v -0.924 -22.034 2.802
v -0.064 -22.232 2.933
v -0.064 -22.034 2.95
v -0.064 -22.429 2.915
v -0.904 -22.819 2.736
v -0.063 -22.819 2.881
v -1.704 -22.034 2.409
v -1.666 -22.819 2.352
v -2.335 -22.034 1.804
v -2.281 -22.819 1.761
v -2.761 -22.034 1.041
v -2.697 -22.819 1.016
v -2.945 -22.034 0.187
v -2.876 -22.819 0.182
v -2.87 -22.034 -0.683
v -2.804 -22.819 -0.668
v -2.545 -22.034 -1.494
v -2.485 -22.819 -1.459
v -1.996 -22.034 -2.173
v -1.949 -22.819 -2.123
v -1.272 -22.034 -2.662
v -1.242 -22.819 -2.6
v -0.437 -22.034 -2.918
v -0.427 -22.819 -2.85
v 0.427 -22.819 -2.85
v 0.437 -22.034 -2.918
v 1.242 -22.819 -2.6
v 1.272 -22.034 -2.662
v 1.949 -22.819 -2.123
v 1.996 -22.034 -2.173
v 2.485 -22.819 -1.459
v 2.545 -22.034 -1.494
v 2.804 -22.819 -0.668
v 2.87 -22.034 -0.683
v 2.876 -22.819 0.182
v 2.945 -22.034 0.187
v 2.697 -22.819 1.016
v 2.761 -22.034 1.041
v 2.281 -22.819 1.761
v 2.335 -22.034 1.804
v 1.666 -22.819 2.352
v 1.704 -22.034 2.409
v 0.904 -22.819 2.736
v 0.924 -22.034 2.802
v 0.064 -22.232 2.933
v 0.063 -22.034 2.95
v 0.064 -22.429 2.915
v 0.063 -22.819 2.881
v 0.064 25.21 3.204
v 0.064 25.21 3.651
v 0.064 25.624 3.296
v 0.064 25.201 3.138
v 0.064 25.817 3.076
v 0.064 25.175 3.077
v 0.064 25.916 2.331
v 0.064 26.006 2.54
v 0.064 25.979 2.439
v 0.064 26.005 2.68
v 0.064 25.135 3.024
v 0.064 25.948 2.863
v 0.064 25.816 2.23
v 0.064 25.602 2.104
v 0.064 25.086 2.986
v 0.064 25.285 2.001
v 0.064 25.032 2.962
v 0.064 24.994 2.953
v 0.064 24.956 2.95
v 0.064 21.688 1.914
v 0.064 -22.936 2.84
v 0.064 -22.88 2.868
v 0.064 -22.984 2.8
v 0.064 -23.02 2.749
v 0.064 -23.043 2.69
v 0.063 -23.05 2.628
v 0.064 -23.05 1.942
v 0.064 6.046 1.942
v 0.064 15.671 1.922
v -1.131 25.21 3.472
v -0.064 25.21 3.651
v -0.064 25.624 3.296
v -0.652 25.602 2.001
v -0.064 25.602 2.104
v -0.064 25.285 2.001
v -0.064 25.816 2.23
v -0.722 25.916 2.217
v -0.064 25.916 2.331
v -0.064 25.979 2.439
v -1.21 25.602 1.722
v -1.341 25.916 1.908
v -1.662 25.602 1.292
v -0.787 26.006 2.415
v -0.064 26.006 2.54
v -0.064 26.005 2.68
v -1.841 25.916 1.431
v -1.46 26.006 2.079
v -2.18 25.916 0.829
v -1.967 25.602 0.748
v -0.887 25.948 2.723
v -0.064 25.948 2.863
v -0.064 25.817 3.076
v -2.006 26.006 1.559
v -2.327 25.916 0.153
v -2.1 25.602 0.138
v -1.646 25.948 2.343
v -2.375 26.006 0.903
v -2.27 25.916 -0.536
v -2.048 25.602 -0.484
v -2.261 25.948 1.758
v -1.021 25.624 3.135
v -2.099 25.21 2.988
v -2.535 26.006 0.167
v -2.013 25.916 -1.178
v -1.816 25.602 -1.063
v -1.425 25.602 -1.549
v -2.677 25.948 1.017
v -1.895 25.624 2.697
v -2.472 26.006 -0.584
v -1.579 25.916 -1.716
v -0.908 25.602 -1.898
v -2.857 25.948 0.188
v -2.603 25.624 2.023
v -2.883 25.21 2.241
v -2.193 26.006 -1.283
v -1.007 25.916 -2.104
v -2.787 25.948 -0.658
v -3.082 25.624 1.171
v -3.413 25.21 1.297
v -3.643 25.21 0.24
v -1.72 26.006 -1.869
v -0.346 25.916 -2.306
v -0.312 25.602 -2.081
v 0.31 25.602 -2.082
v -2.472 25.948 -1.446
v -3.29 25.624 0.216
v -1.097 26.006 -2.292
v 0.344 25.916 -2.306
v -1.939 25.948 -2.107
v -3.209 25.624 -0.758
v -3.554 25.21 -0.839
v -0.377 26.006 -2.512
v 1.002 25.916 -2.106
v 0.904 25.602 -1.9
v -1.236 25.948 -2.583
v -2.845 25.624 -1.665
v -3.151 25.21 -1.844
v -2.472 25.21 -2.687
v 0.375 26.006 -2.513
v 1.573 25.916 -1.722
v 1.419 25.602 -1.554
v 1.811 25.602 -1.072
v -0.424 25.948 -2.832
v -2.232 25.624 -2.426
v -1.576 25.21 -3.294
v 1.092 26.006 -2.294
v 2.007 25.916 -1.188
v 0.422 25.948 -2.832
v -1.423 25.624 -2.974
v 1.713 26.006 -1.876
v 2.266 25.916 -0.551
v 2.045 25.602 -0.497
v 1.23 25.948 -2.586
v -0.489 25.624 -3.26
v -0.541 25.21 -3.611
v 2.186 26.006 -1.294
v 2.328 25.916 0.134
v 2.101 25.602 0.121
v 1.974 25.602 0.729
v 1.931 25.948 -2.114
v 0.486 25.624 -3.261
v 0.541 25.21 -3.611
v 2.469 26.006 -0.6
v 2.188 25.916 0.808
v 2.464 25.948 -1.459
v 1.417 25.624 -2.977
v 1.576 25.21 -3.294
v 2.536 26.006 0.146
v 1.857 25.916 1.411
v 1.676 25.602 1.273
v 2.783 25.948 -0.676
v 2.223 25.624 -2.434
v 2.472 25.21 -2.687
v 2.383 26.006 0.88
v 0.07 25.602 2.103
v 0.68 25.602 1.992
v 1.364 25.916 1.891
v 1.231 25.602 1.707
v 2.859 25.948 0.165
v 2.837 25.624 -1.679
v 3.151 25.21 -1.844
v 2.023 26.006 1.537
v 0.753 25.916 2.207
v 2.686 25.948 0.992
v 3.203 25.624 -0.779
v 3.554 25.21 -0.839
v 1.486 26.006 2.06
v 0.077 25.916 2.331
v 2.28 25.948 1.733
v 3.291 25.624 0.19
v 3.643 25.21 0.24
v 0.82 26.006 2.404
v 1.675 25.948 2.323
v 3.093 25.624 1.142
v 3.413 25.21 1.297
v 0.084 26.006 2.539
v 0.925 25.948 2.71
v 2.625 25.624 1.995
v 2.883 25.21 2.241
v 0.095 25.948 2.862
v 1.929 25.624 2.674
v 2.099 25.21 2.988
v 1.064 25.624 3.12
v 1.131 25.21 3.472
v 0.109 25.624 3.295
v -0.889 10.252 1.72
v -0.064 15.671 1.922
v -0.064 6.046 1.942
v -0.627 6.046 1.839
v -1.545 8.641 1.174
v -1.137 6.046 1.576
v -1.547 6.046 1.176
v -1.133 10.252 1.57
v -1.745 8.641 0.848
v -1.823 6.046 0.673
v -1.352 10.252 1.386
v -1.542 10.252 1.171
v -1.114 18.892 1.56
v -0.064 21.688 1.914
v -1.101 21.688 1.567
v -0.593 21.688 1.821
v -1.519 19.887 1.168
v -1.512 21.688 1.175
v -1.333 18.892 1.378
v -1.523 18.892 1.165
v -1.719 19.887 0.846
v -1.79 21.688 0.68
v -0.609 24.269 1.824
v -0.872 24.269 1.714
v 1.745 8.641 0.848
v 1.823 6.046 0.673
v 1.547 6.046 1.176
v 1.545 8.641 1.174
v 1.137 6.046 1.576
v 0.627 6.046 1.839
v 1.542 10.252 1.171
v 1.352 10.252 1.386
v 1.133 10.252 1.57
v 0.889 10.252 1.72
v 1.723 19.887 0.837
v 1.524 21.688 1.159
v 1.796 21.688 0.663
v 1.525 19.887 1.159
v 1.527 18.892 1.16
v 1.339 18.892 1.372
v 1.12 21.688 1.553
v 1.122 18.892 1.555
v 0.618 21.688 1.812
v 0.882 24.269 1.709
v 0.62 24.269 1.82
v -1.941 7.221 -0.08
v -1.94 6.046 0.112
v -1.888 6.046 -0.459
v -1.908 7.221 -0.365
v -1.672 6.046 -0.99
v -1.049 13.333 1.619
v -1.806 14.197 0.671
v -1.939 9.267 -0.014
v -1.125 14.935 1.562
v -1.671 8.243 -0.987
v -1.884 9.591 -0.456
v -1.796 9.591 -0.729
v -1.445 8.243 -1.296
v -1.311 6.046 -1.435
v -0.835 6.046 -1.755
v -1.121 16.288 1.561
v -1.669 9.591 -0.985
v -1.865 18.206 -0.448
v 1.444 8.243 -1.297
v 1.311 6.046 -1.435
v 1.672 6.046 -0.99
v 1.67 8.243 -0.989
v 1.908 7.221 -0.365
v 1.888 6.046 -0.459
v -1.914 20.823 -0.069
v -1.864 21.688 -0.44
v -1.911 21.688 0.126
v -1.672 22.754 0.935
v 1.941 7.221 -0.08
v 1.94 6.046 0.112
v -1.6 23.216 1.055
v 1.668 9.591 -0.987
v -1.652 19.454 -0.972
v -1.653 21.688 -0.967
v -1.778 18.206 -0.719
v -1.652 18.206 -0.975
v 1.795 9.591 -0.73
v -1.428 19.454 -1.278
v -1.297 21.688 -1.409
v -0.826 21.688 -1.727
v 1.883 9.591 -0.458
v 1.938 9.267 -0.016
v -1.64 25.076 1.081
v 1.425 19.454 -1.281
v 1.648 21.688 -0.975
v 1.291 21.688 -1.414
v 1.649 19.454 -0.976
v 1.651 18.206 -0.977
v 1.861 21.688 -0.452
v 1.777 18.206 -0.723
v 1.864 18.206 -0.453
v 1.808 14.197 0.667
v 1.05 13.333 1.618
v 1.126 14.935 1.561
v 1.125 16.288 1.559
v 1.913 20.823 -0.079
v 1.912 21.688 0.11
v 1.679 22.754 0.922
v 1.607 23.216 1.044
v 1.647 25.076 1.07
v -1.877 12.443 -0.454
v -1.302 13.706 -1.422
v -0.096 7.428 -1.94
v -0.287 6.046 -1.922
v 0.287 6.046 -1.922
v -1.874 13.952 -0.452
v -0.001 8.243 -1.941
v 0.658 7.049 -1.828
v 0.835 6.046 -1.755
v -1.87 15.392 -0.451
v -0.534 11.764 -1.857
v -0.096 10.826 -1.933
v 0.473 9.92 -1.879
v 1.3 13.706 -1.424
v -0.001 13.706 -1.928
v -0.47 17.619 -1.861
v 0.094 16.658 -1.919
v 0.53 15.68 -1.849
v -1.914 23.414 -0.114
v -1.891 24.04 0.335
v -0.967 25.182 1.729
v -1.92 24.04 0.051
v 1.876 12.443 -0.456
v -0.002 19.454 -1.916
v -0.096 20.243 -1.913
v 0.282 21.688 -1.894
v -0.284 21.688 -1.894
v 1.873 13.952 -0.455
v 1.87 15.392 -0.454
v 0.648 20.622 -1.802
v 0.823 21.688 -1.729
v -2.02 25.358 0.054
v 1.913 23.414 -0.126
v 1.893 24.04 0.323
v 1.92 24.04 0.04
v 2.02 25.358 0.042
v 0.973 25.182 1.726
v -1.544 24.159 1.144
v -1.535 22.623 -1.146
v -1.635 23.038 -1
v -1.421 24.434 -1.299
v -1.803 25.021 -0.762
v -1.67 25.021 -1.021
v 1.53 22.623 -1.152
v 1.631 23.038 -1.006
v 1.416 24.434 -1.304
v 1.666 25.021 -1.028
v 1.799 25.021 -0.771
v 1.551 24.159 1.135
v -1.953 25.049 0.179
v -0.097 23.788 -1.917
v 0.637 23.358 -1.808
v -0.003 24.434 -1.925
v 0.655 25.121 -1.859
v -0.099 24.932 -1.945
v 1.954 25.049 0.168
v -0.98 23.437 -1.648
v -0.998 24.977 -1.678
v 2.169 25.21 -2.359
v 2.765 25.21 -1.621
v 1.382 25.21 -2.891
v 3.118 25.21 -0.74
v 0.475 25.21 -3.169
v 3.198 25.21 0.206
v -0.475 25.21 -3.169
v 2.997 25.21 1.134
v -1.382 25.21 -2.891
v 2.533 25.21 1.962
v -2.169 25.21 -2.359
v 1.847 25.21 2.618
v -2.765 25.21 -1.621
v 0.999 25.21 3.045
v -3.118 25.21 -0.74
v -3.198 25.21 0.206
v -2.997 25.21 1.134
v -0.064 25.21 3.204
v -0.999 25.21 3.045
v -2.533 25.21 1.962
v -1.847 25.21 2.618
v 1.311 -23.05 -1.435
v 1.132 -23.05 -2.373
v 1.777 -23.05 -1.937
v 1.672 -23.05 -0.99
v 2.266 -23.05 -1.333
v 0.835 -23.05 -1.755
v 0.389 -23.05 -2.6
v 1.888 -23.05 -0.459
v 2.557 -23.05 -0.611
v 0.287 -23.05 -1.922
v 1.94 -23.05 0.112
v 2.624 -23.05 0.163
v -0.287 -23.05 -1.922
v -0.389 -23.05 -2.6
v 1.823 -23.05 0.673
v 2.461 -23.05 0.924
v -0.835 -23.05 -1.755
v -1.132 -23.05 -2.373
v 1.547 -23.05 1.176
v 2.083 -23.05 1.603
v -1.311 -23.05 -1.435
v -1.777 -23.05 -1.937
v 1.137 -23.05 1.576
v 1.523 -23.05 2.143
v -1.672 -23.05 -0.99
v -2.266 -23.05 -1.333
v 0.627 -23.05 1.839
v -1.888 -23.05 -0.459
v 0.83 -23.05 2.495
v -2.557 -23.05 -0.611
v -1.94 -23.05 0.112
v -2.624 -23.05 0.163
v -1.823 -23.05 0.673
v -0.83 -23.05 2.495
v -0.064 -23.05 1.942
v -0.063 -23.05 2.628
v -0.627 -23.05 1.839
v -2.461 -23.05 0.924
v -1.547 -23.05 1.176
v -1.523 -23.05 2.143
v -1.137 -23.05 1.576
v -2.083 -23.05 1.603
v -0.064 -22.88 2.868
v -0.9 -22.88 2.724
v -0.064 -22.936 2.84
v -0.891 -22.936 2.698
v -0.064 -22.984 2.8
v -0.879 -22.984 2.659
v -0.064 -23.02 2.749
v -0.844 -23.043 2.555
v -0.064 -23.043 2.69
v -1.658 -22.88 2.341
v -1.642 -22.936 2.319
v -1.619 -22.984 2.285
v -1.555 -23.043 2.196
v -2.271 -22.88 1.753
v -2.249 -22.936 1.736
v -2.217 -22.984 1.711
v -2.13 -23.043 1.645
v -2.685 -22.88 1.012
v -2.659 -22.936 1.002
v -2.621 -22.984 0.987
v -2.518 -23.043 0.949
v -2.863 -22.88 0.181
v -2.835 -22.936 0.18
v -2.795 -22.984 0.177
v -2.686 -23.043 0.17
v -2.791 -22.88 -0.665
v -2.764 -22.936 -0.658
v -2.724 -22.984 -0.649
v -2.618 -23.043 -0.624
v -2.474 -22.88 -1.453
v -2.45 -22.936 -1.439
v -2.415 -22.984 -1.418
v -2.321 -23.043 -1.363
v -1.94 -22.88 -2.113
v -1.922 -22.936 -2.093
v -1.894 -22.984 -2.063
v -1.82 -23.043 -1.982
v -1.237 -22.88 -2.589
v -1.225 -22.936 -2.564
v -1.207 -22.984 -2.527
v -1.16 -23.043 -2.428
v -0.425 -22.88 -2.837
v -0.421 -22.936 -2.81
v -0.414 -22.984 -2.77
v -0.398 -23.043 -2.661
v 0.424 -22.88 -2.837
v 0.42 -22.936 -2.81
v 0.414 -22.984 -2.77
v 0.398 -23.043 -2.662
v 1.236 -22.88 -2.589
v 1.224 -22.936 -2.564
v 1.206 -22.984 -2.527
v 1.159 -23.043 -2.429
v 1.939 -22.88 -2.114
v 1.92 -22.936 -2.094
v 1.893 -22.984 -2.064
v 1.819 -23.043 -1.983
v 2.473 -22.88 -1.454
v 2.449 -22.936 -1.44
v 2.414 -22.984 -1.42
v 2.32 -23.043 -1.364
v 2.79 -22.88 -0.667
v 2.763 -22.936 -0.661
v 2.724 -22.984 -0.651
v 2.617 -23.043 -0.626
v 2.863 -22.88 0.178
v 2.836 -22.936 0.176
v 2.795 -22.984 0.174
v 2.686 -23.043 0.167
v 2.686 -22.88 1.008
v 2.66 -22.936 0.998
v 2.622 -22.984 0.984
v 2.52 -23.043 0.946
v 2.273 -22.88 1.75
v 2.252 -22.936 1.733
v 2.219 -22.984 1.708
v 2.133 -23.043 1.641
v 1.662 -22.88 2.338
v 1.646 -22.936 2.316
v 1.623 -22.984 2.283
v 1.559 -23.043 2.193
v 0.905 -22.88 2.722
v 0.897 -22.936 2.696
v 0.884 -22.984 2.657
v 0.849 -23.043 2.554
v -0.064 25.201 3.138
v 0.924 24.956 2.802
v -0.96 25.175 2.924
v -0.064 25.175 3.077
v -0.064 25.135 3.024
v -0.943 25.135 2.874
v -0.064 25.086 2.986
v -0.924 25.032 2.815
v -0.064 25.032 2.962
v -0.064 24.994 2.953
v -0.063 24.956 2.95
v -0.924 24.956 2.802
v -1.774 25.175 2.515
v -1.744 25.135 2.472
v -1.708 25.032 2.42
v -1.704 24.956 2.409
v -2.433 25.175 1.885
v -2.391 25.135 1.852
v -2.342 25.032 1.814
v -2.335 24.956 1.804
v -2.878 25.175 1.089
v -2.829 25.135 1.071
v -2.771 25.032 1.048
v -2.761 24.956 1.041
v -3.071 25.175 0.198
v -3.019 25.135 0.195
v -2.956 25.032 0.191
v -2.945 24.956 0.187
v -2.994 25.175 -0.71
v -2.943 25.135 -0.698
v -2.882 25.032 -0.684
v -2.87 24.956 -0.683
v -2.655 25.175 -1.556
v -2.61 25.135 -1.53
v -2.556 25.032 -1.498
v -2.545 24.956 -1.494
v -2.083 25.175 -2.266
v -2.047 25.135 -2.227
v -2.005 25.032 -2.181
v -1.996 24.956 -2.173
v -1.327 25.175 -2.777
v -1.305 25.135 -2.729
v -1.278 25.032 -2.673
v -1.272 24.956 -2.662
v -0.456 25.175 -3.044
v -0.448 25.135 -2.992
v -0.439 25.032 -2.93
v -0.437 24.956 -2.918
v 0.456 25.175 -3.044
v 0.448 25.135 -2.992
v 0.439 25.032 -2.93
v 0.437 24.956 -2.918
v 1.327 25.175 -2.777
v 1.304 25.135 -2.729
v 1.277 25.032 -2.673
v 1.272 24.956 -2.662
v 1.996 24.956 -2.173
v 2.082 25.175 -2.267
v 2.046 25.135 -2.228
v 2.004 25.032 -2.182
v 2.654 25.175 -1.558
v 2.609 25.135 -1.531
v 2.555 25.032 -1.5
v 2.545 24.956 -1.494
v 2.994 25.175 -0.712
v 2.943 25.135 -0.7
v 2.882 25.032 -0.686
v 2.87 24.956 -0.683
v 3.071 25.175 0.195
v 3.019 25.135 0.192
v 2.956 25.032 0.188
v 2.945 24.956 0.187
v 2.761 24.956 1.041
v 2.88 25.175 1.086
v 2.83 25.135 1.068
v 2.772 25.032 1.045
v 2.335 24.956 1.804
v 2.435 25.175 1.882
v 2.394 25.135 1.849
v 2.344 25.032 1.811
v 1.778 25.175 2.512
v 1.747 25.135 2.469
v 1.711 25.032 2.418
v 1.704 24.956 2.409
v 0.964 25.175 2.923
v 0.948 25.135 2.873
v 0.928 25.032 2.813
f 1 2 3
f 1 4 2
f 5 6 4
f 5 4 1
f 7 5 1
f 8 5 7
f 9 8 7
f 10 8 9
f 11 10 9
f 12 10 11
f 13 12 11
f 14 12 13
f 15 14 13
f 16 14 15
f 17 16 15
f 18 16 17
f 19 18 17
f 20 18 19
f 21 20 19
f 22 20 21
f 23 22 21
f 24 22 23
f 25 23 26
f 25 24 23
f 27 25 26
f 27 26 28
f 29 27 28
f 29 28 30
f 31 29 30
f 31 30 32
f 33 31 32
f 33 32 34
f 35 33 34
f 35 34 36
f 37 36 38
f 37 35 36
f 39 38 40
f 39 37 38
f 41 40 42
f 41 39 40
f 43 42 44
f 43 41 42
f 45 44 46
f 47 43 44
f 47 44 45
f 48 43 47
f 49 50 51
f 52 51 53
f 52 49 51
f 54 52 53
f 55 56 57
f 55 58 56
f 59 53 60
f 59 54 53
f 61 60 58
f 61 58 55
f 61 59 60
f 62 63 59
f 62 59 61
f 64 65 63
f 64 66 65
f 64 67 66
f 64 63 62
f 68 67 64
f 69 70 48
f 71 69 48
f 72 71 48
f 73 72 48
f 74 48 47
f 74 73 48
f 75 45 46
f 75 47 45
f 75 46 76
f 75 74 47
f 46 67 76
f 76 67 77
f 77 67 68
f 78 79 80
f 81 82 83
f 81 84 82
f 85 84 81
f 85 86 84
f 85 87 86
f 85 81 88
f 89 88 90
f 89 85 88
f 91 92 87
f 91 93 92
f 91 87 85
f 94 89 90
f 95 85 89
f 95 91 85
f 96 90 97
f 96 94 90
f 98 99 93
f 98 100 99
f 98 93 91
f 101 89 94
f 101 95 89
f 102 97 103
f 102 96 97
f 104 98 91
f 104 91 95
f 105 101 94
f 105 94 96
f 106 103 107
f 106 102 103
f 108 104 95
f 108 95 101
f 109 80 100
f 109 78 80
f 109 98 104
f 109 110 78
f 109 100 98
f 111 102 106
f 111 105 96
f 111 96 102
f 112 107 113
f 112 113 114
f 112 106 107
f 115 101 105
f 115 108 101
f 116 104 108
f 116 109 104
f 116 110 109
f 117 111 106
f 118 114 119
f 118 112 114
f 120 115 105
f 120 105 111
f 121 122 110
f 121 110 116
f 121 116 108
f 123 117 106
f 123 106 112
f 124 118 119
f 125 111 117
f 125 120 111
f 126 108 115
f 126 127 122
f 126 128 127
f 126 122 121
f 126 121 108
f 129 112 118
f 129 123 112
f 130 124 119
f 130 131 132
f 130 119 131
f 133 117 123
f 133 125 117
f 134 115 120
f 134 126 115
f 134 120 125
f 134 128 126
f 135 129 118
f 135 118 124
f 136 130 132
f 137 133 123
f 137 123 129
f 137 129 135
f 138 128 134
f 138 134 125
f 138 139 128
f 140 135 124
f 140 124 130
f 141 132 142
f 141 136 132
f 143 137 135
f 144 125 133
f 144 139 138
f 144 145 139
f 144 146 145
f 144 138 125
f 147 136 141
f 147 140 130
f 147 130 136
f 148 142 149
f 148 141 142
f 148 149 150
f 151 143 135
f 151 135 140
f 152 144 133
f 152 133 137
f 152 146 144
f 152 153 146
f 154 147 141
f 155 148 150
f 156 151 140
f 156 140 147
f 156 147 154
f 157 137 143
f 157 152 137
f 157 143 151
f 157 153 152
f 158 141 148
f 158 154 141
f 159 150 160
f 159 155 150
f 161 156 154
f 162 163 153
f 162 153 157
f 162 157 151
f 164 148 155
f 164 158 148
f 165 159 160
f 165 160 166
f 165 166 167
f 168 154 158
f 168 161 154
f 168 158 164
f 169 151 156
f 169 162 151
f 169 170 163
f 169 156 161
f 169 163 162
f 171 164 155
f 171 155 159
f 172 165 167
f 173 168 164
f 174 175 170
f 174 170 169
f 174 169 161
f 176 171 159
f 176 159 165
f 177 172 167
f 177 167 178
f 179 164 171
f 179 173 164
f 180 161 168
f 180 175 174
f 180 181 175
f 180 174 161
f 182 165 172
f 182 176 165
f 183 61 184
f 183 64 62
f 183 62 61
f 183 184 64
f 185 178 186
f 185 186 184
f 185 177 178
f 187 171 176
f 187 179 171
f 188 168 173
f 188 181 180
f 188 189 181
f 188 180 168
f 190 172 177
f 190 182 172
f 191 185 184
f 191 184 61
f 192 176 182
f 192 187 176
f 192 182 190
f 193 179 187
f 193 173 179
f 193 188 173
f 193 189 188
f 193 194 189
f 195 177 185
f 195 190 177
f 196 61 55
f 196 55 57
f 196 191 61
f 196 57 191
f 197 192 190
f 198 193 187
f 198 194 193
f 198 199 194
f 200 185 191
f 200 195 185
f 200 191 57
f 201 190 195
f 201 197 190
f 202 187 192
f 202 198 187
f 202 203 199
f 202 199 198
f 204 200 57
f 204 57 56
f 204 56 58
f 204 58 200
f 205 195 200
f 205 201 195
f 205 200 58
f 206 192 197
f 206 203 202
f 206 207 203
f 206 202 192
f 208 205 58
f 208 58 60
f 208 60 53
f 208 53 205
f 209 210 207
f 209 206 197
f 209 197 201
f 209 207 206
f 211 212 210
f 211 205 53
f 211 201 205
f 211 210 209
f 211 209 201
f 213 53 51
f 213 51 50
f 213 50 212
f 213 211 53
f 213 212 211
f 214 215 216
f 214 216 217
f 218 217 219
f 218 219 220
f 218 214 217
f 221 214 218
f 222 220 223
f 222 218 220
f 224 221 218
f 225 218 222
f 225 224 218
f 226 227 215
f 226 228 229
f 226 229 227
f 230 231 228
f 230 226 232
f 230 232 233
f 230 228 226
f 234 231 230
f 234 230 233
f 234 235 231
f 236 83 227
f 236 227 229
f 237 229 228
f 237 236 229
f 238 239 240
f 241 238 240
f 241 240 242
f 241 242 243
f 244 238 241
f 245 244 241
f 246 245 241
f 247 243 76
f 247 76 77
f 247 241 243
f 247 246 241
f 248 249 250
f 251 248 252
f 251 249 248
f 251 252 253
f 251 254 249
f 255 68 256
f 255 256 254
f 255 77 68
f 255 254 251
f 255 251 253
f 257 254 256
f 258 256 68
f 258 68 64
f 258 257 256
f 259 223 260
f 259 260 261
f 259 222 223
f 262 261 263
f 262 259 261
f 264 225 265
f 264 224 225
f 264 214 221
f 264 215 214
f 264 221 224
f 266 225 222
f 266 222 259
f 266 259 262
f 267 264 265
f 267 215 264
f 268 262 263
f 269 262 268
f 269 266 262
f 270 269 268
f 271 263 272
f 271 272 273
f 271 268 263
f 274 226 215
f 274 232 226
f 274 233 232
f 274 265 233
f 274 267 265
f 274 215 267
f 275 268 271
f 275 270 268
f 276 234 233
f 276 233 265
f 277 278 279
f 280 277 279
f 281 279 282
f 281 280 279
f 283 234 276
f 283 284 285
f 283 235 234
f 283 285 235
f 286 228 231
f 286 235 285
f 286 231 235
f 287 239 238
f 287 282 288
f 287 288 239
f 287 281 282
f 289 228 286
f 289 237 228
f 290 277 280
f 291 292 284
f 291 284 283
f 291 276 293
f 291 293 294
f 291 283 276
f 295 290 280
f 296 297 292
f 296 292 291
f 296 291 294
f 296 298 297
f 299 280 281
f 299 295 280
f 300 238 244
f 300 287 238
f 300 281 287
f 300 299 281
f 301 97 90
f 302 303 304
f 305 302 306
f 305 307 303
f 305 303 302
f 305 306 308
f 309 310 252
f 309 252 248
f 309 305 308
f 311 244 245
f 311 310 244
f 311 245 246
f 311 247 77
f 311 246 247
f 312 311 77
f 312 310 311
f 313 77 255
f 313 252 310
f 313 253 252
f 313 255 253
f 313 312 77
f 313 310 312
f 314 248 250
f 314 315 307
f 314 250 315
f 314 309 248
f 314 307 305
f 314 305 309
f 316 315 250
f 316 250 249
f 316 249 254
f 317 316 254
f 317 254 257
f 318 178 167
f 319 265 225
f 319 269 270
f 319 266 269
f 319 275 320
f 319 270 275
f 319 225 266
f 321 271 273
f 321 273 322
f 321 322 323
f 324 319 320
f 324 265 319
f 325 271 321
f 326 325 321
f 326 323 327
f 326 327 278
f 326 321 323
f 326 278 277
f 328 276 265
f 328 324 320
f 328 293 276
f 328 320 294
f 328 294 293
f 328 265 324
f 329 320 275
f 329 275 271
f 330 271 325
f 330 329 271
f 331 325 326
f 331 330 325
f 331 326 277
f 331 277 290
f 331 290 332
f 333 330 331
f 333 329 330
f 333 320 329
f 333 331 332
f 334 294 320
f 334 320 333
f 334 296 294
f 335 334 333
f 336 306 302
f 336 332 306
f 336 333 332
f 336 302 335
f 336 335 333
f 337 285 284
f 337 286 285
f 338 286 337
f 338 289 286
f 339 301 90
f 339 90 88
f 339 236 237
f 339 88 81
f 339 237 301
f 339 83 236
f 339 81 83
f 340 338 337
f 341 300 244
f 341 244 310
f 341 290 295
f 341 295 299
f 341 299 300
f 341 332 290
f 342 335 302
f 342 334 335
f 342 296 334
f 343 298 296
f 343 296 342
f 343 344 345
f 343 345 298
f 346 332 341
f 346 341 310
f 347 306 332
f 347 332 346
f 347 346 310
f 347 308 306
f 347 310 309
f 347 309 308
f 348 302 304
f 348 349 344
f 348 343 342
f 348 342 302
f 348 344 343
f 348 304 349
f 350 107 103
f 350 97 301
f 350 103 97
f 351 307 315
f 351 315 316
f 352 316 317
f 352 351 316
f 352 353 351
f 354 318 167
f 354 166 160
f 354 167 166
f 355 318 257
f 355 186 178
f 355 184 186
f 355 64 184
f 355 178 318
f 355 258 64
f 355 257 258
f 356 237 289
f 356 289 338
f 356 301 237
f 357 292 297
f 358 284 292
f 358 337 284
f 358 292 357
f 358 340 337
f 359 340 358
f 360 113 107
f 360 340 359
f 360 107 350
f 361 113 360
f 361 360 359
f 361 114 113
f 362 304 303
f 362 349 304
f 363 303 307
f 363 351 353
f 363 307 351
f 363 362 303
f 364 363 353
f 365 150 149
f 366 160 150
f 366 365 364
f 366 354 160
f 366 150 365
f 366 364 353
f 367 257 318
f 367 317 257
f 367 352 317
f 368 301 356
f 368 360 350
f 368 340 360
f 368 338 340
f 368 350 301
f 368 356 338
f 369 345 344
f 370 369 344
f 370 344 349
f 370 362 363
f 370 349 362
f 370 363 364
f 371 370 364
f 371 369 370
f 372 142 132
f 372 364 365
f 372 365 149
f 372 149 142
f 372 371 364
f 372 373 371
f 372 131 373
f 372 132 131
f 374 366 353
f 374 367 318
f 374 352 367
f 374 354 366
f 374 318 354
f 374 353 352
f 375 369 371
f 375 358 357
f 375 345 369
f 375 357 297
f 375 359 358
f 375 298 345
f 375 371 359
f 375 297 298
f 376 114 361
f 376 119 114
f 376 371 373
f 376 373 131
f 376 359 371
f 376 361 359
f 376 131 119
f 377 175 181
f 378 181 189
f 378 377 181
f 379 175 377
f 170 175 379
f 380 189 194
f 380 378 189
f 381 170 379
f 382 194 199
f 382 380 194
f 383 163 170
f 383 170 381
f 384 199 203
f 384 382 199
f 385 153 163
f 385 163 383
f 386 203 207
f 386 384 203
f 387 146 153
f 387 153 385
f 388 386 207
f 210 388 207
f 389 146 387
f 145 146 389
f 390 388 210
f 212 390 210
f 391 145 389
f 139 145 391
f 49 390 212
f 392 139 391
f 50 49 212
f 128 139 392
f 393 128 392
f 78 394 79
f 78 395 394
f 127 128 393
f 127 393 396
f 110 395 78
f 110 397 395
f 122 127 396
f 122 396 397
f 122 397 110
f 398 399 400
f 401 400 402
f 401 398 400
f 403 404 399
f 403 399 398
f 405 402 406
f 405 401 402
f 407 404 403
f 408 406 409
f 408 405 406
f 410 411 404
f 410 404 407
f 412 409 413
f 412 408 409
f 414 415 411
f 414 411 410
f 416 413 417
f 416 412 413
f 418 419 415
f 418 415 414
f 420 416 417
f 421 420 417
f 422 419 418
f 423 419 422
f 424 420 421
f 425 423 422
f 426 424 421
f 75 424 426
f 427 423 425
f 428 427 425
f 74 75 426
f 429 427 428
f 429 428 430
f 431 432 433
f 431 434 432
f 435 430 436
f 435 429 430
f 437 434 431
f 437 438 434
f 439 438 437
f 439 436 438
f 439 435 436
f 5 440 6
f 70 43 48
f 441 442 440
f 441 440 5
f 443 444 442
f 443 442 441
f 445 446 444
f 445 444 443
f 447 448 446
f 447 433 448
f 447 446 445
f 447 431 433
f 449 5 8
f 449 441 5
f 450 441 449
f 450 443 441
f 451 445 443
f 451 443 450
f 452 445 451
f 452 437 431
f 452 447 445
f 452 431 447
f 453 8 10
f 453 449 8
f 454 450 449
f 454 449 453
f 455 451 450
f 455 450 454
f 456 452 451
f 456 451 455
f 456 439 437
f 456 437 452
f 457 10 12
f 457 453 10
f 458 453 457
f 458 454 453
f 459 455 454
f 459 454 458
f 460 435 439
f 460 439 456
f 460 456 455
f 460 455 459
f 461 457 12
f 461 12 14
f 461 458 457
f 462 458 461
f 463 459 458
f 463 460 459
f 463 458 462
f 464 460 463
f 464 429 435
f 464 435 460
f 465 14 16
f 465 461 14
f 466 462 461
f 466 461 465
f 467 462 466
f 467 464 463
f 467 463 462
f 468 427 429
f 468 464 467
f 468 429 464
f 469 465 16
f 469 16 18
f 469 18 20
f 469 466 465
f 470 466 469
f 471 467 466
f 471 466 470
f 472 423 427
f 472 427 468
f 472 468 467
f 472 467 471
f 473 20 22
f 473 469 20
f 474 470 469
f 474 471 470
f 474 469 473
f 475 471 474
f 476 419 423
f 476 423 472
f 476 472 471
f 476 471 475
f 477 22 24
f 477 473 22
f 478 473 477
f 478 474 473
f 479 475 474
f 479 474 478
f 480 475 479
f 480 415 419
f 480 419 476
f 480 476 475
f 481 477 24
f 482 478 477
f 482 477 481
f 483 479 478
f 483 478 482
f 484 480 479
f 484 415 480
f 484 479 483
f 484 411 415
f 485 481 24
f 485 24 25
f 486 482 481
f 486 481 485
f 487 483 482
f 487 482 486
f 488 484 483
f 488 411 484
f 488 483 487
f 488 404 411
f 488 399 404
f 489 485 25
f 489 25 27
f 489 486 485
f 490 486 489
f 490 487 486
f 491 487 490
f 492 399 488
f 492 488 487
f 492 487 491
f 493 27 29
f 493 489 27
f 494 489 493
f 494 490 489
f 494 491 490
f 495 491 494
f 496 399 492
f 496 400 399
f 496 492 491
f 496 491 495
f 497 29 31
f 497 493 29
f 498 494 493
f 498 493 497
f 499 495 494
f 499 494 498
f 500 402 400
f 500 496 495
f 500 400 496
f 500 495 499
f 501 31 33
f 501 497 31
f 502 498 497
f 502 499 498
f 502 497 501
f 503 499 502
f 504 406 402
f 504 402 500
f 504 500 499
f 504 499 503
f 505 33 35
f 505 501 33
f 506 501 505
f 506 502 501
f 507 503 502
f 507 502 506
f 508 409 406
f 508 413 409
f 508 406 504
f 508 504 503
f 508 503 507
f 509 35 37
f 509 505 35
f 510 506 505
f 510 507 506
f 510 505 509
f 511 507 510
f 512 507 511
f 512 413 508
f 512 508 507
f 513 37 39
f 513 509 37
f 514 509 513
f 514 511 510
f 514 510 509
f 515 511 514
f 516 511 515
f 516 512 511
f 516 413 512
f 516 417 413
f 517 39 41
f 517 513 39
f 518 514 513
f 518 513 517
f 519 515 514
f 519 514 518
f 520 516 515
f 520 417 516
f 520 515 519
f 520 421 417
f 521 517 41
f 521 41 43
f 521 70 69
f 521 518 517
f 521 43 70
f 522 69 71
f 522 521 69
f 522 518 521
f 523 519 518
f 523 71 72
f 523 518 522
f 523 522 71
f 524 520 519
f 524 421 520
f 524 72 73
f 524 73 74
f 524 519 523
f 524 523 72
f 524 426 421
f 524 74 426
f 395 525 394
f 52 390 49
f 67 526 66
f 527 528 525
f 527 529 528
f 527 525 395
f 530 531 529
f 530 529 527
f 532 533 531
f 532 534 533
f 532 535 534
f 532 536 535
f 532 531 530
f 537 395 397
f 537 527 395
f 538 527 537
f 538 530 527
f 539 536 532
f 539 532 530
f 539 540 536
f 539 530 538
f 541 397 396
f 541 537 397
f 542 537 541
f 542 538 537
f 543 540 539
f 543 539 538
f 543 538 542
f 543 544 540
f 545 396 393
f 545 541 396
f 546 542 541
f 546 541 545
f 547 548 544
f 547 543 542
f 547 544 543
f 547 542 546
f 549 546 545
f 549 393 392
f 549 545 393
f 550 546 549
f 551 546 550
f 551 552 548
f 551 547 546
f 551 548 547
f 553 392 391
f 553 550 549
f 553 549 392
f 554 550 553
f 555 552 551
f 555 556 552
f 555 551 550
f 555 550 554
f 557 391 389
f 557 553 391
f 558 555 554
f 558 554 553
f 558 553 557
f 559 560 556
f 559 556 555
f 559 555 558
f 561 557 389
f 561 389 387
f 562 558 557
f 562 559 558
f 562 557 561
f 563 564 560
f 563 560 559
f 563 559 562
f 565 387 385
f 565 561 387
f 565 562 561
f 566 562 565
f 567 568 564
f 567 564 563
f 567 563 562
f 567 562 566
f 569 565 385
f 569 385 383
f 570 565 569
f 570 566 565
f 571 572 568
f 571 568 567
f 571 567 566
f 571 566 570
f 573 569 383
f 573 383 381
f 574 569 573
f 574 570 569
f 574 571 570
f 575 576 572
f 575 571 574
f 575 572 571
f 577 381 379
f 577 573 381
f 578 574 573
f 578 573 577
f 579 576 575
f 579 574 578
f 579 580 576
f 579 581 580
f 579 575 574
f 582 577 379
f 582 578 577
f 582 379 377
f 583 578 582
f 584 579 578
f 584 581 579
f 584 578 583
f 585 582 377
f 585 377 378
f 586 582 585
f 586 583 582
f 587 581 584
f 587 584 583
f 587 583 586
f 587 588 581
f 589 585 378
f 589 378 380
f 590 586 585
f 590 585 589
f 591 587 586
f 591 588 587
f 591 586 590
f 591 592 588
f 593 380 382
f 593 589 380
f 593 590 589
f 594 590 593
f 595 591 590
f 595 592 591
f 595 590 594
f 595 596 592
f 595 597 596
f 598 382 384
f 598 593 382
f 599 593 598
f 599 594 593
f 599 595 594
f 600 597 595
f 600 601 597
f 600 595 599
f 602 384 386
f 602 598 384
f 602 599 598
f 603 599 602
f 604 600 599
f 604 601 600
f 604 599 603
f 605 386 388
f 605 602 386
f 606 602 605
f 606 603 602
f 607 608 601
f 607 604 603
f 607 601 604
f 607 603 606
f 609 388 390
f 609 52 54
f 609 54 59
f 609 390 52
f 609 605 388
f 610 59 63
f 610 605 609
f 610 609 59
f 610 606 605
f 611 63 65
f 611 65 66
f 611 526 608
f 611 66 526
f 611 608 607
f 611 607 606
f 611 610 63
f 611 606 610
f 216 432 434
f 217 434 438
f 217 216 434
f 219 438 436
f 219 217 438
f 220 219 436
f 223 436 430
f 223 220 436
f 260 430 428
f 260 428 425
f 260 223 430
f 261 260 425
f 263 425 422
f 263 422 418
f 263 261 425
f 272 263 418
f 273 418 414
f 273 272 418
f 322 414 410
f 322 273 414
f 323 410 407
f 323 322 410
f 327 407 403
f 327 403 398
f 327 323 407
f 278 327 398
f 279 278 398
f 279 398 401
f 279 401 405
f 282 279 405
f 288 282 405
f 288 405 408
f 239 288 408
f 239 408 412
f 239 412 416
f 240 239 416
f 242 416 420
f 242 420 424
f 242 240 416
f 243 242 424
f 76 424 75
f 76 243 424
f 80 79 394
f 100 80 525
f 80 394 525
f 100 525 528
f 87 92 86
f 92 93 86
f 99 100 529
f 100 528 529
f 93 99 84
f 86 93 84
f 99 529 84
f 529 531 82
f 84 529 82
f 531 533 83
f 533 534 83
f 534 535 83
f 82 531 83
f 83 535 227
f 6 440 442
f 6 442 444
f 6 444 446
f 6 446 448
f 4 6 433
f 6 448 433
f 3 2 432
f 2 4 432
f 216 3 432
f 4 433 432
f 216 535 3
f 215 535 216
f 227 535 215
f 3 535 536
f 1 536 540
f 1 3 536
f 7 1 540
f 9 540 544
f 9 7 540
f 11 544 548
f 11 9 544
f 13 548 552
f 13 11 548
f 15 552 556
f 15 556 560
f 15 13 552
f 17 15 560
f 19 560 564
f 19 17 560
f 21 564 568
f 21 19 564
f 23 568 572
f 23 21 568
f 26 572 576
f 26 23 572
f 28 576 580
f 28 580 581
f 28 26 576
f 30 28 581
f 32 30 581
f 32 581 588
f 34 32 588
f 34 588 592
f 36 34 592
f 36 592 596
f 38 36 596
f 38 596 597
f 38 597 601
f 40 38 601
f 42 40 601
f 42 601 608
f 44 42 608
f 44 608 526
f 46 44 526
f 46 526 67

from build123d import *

# Parameters (mm, degrees)
CUT_EXTRUDE1_DEPTH      = 27.518252873
CUT_EXTRUDE1_DEPTH_BACK = 27.518252873
SKETCH4_W               = 0.127
SKETCH4_H               = 4.445496727
CHAMFER1_SIZE           = 1.016
CHAMFER1_SIZE2          = 0.088888482
FILLET1_R               = 0.254


with BuildPart() as part:
    # Sketch3 → Revolve1 (revolve)
    with BuildSketch(Plane(origin=(0, 0, 0), x_dir=(0, 0, -1), z_dir=(1, 0, 0)), mode=Mode.PRIVATE) as revolve1_sk:
        with BuildLine():
            Line((1.9431, -9.0805), (1.9431, 6.045643841))
            add(Edge.make_bspline(
                [(1.9431, 6.045643841), (1.9431, 10.091751432), (1.891096799, 23.164078911), (1.955698004, 25.891289644), (2.657297247, 26.530501845), (3.65125, 25.2095)],
                knots=[0, 0, 0, 0, 0.515431556, 0.615431556, 1, 1, 1, 1], degree=3))
            Line((3.65125, 25.2095), (3.20458454, 25.2095))
            ThreePointArc((3.20458454, 25.2095), (3.024979417, 25.135105122), (2.95058454, 24.9555))
            Line((2.95058454, 24.9555), (2.95058454, 24.211681499))
            Line((2.95058454, 24.211681499), (2.95058454, -9.0805))
            Line((2.95058454, -9.0805), (2.95058454, -23.0505))
            Line((2.95058454, -23.0505), (1.9431, -23.0505))
            Line((1.9431, -23.0505), (1.9431, -9.0805))
        make_face()
    revolve(revolve1_sk.sketch.rotate(Axis((0, 25.2095, 0), (0, -1, 0)), 180), axis=Axis((0, 25.2095, 0), (0, -1, 0)))

    # Sketch4 → Cut-Extrude1 (cut, two sides: drawn at the far end of the back side and taken through both)
    with BuildSketch(Plane(origin=(0, 0, 0), x_dir=(1, 0, 0), z_dir=(0, 1, 0)).offset(-CUT_EXTRUDE1_DEPTH_BACK)):
        with Locations((0, -2.222748364)):
            Rectangle(SKETCH4_W, SKETCH4_H)
    extrude(amount=CUT_EXTRUDE1_DEPTH + CUT_EXTRUDE1_DEPTH_BACK, mode=Mode.SUBTRACT)

    # Chamfer1
    chamfer1_edges = [part.edges().sort_by_distance(p)[0] for p in [
        (0, -23.0505, -2.95058454),
    ]]
    chamfer1_side = [part.faces().sort_by_distance(p)[0] for p in [
        (0, 0.9525, -2.95058454),
    ]]
    chamfer(chamfer1_edges, length=CHAMFER1_SIZE, length2=CHAMFER1_SIZE2, reference=chamfer1_side[0])

    # Fillet1
    fillet1_edges = [part.edges().sort_by_distance(p)[0] for p in [
        (0, -23.0505, -2.861696057),
    ]]
    fillet(fillet1_edges, radius=FILLET1_R)


solid = part.part
